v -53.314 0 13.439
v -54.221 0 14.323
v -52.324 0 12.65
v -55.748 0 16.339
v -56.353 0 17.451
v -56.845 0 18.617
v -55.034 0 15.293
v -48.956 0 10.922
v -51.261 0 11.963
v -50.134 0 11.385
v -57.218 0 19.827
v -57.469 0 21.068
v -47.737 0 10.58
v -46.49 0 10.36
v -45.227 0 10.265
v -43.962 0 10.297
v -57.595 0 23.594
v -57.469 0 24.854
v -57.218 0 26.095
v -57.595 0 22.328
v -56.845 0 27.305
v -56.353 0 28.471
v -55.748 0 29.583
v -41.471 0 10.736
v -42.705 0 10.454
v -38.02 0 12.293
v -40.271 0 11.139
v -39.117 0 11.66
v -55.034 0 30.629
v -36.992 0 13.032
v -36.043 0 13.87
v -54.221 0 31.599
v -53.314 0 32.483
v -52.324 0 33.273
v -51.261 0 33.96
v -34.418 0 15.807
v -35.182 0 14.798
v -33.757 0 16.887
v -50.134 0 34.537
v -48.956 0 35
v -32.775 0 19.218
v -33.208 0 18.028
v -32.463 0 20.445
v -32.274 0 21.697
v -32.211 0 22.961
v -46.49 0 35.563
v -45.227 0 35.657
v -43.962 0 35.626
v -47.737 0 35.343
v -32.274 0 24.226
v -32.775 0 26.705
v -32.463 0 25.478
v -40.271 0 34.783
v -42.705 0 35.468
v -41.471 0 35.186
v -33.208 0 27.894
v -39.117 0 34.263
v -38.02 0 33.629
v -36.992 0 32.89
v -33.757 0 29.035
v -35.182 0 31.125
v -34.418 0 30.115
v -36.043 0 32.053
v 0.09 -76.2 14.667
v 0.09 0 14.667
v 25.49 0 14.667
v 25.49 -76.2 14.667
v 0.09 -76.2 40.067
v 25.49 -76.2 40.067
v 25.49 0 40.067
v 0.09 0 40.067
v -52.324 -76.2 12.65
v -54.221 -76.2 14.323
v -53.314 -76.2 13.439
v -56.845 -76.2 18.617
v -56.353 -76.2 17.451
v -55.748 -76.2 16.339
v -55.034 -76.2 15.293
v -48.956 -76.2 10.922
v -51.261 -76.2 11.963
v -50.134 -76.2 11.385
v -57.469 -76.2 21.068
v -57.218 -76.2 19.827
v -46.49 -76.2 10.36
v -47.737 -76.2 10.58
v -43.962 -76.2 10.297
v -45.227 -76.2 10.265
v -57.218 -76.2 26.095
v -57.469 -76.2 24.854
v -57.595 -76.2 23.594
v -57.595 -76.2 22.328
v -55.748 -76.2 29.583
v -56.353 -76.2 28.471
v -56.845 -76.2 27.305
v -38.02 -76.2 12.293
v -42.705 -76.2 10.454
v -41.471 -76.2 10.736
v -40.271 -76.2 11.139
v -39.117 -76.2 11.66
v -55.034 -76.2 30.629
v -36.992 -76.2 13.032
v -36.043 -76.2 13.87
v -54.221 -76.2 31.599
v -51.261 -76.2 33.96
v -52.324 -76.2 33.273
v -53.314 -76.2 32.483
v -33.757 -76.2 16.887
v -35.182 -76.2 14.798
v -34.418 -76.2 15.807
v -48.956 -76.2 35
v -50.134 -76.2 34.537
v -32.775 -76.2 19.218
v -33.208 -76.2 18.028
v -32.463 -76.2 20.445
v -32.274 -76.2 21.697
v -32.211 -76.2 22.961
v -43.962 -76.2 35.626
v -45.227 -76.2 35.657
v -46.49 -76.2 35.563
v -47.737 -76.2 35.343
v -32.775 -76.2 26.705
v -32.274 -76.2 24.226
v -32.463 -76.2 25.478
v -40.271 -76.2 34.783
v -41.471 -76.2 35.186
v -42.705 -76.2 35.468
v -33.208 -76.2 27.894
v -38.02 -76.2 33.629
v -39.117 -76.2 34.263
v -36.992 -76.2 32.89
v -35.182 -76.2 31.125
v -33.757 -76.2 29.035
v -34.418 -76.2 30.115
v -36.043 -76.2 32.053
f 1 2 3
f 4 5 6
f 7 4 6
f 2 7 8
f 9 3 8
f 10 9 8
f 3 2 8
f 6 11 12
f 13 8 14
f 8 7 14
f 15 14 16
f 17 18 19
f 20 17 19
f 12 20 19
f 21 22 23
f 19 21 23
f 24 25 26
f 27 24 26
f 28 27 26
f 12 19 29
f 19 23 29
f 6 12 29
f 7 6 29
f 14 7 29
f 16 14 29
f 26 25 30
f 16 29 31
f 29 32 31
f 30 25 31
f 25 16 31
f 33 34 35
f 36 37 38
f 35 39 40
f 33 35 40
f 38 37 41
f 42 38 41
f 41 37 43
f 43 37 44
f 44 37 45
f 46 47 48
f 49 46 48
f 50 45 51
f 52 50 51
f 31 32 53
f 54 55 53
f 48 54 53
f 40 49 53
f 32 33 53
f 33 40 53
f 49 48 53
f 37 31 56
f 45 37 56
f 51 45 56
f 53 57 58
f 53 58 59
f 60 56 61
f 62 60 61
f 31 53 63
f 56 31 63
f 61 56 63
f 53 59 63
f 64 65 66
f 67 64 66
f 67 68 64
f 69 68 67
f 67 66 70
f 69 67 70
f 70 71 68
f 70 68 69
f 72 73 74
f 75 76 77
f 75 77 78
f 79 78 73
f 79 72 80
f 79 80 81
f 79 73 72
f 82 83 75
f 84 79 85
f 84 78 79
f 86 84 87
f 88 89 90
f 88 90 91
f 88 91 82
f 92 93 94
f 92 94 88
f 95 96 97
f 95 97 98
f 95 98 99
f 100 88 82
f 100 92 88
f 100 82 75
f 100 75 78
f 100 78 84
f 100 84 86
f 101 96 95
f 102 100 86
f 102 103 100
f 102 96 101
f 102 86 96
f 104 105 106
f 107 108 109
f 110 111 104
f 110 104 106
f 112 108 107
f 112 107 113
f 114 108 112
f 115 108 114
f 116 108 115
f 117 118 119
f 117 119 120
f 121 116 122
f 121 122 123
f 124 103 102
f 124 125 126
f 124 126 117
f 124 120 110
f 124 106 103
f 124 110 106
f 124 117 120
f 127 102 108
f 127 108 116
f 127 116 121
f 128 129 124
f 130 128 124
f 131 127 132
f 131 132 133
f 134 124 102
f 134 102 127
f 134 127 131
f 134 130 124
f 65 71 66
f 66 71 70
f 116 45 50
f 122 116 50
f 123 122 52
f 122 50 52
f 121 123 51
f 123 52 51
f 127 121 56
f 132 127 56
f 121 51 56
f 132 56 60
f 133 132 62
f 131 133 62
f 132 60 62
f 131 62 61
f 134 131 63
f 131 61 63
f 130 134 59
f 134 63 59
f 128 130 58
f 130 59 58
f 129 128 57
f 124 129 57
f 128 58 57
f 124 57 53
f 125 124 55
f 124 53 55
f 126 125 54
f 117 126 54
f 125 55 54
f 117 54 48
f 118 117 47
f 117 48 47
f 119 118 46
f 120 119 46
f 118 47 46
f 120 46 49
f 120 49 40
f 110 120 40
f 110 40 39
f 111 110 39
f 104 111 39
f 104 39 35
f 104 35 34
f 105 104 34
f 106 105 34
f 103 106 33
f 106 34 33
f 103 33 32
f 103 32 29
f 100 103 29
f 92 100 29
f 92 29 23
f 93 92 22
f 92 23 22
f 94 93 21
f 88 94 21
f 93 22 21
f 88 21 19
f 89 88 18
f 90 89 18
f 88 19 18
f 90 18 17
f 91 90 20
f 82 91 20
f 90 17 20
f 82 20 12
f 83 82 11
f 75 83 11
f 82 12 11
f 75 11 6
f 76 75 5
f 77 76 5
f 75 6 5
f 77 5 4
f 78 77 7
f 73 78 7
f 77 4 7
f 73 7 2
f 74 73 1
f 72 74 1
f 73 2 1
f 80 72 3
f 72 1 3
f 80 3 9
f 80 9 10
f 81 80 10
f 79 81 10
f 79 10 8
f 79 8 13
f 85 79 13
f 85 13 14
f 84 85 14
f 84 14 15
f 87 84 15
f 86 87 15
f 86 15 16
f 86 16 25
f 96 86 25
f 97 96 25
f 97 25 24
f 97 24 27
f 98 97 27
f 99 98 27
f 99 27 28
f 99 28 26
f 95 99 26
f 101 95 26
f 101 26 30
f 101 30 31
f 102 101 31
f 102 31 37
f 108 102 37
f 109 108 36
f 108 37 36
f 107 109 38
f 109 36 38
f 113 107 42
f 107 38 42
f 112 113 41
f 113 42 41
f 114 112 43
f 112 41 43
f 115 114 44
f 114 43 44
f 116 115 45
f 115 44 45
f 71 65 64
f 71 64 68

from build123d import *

# Parameters (mm, degrees)
F0_R     = 12.7
F0_W     = 25.4
F0_H     = 25.4
F1_DEPTH = 76.2


with BuildPart() as f1:
    # F0 (on Front) → F1 (new body)
    with BuildSketch(Plane.XZ):
        with Locations((-44.910796, 22.961151)):
            Circle(F0_R)
        with Locations((12.789911, 27.366814)):
            Rectangle(F0_W, F0_H)
    extrude(amount=F1_DEPTH)


solid = f1.part
